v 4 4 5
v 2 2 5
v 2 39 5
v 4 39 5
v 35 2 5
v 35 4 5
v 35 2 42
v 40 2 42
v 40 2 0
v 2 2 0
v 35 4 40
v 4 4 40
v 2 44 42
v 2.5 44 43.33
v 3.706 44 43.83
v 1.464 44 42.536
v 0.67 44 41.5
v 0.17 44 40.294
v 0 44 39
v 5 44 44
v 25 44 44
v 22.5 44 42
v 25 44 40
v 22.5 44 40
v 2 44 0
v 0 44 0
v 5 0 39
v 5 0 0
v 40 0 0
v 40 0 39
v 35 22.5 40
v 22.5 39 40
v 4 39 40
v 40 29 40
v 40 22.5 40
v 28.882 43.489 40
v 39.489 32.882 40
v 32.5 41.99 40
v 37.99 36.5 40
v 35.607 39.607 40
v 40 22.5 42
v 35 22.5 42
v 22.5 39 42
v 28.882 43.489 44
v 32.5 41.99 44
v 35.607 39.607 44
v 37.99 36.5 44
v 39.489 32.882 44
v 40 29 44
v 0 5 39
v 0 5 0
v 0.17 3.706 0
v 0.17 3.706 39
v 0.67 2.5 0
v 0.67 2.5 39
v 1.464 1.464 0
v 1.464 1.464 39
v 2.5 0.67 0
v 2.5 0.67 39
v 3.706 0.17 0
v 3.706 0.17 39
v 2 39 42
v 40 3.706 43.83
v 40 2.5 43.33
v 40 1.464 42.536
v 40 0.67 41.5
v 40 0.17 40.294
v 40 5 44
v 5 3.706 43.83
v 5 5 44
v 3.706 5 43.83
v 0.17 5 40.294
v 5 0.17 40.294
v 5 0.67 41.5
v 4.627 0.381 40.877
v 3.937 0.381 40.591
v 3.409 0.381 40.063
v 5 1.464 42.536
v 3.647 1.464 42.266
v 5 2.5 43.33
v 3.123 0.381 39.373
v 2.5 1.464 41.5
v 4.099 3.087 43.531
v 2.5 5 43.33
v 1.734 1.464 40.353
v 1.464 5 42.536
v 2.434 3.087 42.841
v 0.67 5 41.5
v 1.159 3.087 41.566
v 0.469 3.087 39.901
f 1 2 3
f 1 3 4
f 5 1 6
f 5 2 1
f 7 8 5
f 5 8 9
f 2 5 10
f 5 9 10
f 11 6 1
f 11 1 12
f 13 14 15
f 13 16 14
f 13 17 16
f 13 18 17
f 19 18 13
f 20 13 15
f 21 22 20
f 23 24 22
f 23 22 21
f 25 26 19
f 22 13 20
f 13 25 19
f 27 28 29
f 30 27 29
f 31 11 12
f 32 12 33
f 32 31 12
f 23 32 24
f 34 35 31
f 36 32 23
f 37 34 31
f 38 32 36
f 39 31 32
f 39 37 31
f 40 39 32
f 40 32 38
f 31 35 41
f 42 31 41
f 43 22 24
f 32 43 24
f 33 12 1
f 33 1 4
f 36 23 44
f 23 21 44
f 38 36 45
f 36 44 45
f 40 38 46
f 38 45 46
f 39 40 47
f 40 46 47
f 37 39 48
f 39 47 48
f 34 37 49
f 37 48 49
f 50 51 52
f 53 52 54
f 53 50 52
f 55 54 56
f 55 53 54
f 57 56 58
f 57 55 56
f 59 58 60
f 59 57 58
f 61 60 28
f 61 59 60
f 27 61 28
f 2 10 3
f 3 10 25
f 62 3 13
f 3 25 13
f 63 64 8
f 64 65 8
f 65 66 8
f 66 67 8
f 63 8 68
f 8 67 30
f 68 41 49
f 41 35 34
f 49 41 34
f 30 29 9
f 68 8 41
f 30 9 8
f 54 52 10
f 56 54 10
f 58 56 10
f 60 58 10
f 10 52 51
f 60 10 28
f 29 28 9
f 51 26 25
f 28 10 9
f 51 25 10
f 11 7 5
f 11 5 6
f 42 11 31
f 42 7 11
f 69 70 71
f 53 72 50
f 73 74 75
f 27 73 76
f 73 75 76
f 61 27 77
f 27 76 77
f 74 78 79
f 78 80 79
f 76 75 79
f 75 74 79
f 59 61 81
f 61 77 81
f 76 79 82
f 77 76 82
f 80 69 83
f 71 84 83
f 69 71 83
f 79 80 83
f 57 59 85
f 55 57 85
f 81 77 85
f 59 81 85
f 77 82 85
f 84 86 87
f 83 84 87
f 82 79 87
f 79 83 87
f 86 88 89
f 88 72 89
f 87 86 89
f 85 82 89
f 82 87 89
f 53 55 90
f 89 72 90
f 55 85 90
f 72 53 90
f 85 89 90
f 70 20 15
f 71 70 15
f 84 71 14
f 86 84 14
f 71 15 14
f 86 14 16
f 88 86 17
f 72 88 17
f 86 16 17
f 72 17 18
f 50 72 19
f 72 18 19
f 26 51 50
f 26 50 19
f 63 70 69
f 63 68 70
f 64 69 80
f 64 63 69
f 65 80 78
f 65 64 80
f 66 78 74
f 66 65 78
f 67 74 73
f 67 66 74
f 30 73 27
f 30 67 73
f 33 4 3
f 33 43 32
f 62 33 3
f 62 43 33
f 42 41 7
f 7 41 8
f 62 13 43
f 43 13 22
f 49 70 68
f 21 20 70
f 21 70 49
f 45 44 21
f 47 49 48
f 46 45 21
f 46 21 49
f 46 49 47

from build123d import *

# Parameters (mm, degrees)
F0_W      = 40
F0_H      = 44
F1_DEPTH  = 44
F2_W      = 40
F2_H      = 40
F3_DEPTH  = 36
F5_DEPTH  = 5
F7_DEPTH  = 5
F8_R      = 15
F9_R      = 5
F11_DEPTH = 5


# Not quite as in the source:
# - a feature names something its author has since deleted; it is built from what else it names


with BuildPart() as f1:
    # F0 (on Top) → F1 (new body)
    with BuildSketch(Plane.XY):
        with Locations((20, 22)):
            Rectangle(F0_W, F0_H)
    extrude(amount=F1_DEPTH)

    # F2 (on face) → F3 (cut)
    with BuildSketch(Plane.YZ.offset(40)):
        with Locations((24, 20)):
            Rectangle(F2_W, F2_H)
    extrude(amount=-F3_DEPTH, mode=Mode.SUBTRACT)

    # F4 (on face) → F5 (cut)
    with BuildSketch(Plane.YZ.offset(40)):
        Polygon((2, 42), (2, 0), (4, 0), (4, 40), (22.5, 40), (22.5, 42), align=None)
    extrude(amount=-F5_DEPTH, mode=Mode.SUBTRACT)

    # F6 (on face) → F7 (cut)
    with BuildSketch(Plane(origin=(0, 44, 0), x_dir=(-1, 0, 0), z_dir=(0, 1, 0))):
        Polygon((-4, 40), (-4, 0), (-2, 0), (-2, 42), (-22.5, 42), (-22.5, 40), align=None)
    extrude(amount=-F7_DEPTH, mode=Mode.SUBTRACT)

    # F8
    f8_edges = [f1.edges().sort_by_distance(p)[0] for p in [
        (40, 44, 42),
    ]]
    fillet(f8_edges, radius=F8_R)

    # F9
    f9_edges = [f1.edges().sort_by_distance(p)[0] for p in [
        (0, 22, 44),
        (20, 0, 44),
        (0, 0, 22),
    ]]
    fillet(f9_edges, radius=F9_R)

    # F10 (on face) → F11 (cut)
    with BuildSketch(Plane(origin=(0, 0, 0), x_dir=(1, 0, 0), z_dir=(0, 0, -1))):
        Polygon((35, -4), (35, -2), (2, -2), (2, -39), (4, -39), (4, -4), align=None)
    extrude(amount=-F11_DEPTH, mode=Mode.SUBTRACT)


solid = f1.part
